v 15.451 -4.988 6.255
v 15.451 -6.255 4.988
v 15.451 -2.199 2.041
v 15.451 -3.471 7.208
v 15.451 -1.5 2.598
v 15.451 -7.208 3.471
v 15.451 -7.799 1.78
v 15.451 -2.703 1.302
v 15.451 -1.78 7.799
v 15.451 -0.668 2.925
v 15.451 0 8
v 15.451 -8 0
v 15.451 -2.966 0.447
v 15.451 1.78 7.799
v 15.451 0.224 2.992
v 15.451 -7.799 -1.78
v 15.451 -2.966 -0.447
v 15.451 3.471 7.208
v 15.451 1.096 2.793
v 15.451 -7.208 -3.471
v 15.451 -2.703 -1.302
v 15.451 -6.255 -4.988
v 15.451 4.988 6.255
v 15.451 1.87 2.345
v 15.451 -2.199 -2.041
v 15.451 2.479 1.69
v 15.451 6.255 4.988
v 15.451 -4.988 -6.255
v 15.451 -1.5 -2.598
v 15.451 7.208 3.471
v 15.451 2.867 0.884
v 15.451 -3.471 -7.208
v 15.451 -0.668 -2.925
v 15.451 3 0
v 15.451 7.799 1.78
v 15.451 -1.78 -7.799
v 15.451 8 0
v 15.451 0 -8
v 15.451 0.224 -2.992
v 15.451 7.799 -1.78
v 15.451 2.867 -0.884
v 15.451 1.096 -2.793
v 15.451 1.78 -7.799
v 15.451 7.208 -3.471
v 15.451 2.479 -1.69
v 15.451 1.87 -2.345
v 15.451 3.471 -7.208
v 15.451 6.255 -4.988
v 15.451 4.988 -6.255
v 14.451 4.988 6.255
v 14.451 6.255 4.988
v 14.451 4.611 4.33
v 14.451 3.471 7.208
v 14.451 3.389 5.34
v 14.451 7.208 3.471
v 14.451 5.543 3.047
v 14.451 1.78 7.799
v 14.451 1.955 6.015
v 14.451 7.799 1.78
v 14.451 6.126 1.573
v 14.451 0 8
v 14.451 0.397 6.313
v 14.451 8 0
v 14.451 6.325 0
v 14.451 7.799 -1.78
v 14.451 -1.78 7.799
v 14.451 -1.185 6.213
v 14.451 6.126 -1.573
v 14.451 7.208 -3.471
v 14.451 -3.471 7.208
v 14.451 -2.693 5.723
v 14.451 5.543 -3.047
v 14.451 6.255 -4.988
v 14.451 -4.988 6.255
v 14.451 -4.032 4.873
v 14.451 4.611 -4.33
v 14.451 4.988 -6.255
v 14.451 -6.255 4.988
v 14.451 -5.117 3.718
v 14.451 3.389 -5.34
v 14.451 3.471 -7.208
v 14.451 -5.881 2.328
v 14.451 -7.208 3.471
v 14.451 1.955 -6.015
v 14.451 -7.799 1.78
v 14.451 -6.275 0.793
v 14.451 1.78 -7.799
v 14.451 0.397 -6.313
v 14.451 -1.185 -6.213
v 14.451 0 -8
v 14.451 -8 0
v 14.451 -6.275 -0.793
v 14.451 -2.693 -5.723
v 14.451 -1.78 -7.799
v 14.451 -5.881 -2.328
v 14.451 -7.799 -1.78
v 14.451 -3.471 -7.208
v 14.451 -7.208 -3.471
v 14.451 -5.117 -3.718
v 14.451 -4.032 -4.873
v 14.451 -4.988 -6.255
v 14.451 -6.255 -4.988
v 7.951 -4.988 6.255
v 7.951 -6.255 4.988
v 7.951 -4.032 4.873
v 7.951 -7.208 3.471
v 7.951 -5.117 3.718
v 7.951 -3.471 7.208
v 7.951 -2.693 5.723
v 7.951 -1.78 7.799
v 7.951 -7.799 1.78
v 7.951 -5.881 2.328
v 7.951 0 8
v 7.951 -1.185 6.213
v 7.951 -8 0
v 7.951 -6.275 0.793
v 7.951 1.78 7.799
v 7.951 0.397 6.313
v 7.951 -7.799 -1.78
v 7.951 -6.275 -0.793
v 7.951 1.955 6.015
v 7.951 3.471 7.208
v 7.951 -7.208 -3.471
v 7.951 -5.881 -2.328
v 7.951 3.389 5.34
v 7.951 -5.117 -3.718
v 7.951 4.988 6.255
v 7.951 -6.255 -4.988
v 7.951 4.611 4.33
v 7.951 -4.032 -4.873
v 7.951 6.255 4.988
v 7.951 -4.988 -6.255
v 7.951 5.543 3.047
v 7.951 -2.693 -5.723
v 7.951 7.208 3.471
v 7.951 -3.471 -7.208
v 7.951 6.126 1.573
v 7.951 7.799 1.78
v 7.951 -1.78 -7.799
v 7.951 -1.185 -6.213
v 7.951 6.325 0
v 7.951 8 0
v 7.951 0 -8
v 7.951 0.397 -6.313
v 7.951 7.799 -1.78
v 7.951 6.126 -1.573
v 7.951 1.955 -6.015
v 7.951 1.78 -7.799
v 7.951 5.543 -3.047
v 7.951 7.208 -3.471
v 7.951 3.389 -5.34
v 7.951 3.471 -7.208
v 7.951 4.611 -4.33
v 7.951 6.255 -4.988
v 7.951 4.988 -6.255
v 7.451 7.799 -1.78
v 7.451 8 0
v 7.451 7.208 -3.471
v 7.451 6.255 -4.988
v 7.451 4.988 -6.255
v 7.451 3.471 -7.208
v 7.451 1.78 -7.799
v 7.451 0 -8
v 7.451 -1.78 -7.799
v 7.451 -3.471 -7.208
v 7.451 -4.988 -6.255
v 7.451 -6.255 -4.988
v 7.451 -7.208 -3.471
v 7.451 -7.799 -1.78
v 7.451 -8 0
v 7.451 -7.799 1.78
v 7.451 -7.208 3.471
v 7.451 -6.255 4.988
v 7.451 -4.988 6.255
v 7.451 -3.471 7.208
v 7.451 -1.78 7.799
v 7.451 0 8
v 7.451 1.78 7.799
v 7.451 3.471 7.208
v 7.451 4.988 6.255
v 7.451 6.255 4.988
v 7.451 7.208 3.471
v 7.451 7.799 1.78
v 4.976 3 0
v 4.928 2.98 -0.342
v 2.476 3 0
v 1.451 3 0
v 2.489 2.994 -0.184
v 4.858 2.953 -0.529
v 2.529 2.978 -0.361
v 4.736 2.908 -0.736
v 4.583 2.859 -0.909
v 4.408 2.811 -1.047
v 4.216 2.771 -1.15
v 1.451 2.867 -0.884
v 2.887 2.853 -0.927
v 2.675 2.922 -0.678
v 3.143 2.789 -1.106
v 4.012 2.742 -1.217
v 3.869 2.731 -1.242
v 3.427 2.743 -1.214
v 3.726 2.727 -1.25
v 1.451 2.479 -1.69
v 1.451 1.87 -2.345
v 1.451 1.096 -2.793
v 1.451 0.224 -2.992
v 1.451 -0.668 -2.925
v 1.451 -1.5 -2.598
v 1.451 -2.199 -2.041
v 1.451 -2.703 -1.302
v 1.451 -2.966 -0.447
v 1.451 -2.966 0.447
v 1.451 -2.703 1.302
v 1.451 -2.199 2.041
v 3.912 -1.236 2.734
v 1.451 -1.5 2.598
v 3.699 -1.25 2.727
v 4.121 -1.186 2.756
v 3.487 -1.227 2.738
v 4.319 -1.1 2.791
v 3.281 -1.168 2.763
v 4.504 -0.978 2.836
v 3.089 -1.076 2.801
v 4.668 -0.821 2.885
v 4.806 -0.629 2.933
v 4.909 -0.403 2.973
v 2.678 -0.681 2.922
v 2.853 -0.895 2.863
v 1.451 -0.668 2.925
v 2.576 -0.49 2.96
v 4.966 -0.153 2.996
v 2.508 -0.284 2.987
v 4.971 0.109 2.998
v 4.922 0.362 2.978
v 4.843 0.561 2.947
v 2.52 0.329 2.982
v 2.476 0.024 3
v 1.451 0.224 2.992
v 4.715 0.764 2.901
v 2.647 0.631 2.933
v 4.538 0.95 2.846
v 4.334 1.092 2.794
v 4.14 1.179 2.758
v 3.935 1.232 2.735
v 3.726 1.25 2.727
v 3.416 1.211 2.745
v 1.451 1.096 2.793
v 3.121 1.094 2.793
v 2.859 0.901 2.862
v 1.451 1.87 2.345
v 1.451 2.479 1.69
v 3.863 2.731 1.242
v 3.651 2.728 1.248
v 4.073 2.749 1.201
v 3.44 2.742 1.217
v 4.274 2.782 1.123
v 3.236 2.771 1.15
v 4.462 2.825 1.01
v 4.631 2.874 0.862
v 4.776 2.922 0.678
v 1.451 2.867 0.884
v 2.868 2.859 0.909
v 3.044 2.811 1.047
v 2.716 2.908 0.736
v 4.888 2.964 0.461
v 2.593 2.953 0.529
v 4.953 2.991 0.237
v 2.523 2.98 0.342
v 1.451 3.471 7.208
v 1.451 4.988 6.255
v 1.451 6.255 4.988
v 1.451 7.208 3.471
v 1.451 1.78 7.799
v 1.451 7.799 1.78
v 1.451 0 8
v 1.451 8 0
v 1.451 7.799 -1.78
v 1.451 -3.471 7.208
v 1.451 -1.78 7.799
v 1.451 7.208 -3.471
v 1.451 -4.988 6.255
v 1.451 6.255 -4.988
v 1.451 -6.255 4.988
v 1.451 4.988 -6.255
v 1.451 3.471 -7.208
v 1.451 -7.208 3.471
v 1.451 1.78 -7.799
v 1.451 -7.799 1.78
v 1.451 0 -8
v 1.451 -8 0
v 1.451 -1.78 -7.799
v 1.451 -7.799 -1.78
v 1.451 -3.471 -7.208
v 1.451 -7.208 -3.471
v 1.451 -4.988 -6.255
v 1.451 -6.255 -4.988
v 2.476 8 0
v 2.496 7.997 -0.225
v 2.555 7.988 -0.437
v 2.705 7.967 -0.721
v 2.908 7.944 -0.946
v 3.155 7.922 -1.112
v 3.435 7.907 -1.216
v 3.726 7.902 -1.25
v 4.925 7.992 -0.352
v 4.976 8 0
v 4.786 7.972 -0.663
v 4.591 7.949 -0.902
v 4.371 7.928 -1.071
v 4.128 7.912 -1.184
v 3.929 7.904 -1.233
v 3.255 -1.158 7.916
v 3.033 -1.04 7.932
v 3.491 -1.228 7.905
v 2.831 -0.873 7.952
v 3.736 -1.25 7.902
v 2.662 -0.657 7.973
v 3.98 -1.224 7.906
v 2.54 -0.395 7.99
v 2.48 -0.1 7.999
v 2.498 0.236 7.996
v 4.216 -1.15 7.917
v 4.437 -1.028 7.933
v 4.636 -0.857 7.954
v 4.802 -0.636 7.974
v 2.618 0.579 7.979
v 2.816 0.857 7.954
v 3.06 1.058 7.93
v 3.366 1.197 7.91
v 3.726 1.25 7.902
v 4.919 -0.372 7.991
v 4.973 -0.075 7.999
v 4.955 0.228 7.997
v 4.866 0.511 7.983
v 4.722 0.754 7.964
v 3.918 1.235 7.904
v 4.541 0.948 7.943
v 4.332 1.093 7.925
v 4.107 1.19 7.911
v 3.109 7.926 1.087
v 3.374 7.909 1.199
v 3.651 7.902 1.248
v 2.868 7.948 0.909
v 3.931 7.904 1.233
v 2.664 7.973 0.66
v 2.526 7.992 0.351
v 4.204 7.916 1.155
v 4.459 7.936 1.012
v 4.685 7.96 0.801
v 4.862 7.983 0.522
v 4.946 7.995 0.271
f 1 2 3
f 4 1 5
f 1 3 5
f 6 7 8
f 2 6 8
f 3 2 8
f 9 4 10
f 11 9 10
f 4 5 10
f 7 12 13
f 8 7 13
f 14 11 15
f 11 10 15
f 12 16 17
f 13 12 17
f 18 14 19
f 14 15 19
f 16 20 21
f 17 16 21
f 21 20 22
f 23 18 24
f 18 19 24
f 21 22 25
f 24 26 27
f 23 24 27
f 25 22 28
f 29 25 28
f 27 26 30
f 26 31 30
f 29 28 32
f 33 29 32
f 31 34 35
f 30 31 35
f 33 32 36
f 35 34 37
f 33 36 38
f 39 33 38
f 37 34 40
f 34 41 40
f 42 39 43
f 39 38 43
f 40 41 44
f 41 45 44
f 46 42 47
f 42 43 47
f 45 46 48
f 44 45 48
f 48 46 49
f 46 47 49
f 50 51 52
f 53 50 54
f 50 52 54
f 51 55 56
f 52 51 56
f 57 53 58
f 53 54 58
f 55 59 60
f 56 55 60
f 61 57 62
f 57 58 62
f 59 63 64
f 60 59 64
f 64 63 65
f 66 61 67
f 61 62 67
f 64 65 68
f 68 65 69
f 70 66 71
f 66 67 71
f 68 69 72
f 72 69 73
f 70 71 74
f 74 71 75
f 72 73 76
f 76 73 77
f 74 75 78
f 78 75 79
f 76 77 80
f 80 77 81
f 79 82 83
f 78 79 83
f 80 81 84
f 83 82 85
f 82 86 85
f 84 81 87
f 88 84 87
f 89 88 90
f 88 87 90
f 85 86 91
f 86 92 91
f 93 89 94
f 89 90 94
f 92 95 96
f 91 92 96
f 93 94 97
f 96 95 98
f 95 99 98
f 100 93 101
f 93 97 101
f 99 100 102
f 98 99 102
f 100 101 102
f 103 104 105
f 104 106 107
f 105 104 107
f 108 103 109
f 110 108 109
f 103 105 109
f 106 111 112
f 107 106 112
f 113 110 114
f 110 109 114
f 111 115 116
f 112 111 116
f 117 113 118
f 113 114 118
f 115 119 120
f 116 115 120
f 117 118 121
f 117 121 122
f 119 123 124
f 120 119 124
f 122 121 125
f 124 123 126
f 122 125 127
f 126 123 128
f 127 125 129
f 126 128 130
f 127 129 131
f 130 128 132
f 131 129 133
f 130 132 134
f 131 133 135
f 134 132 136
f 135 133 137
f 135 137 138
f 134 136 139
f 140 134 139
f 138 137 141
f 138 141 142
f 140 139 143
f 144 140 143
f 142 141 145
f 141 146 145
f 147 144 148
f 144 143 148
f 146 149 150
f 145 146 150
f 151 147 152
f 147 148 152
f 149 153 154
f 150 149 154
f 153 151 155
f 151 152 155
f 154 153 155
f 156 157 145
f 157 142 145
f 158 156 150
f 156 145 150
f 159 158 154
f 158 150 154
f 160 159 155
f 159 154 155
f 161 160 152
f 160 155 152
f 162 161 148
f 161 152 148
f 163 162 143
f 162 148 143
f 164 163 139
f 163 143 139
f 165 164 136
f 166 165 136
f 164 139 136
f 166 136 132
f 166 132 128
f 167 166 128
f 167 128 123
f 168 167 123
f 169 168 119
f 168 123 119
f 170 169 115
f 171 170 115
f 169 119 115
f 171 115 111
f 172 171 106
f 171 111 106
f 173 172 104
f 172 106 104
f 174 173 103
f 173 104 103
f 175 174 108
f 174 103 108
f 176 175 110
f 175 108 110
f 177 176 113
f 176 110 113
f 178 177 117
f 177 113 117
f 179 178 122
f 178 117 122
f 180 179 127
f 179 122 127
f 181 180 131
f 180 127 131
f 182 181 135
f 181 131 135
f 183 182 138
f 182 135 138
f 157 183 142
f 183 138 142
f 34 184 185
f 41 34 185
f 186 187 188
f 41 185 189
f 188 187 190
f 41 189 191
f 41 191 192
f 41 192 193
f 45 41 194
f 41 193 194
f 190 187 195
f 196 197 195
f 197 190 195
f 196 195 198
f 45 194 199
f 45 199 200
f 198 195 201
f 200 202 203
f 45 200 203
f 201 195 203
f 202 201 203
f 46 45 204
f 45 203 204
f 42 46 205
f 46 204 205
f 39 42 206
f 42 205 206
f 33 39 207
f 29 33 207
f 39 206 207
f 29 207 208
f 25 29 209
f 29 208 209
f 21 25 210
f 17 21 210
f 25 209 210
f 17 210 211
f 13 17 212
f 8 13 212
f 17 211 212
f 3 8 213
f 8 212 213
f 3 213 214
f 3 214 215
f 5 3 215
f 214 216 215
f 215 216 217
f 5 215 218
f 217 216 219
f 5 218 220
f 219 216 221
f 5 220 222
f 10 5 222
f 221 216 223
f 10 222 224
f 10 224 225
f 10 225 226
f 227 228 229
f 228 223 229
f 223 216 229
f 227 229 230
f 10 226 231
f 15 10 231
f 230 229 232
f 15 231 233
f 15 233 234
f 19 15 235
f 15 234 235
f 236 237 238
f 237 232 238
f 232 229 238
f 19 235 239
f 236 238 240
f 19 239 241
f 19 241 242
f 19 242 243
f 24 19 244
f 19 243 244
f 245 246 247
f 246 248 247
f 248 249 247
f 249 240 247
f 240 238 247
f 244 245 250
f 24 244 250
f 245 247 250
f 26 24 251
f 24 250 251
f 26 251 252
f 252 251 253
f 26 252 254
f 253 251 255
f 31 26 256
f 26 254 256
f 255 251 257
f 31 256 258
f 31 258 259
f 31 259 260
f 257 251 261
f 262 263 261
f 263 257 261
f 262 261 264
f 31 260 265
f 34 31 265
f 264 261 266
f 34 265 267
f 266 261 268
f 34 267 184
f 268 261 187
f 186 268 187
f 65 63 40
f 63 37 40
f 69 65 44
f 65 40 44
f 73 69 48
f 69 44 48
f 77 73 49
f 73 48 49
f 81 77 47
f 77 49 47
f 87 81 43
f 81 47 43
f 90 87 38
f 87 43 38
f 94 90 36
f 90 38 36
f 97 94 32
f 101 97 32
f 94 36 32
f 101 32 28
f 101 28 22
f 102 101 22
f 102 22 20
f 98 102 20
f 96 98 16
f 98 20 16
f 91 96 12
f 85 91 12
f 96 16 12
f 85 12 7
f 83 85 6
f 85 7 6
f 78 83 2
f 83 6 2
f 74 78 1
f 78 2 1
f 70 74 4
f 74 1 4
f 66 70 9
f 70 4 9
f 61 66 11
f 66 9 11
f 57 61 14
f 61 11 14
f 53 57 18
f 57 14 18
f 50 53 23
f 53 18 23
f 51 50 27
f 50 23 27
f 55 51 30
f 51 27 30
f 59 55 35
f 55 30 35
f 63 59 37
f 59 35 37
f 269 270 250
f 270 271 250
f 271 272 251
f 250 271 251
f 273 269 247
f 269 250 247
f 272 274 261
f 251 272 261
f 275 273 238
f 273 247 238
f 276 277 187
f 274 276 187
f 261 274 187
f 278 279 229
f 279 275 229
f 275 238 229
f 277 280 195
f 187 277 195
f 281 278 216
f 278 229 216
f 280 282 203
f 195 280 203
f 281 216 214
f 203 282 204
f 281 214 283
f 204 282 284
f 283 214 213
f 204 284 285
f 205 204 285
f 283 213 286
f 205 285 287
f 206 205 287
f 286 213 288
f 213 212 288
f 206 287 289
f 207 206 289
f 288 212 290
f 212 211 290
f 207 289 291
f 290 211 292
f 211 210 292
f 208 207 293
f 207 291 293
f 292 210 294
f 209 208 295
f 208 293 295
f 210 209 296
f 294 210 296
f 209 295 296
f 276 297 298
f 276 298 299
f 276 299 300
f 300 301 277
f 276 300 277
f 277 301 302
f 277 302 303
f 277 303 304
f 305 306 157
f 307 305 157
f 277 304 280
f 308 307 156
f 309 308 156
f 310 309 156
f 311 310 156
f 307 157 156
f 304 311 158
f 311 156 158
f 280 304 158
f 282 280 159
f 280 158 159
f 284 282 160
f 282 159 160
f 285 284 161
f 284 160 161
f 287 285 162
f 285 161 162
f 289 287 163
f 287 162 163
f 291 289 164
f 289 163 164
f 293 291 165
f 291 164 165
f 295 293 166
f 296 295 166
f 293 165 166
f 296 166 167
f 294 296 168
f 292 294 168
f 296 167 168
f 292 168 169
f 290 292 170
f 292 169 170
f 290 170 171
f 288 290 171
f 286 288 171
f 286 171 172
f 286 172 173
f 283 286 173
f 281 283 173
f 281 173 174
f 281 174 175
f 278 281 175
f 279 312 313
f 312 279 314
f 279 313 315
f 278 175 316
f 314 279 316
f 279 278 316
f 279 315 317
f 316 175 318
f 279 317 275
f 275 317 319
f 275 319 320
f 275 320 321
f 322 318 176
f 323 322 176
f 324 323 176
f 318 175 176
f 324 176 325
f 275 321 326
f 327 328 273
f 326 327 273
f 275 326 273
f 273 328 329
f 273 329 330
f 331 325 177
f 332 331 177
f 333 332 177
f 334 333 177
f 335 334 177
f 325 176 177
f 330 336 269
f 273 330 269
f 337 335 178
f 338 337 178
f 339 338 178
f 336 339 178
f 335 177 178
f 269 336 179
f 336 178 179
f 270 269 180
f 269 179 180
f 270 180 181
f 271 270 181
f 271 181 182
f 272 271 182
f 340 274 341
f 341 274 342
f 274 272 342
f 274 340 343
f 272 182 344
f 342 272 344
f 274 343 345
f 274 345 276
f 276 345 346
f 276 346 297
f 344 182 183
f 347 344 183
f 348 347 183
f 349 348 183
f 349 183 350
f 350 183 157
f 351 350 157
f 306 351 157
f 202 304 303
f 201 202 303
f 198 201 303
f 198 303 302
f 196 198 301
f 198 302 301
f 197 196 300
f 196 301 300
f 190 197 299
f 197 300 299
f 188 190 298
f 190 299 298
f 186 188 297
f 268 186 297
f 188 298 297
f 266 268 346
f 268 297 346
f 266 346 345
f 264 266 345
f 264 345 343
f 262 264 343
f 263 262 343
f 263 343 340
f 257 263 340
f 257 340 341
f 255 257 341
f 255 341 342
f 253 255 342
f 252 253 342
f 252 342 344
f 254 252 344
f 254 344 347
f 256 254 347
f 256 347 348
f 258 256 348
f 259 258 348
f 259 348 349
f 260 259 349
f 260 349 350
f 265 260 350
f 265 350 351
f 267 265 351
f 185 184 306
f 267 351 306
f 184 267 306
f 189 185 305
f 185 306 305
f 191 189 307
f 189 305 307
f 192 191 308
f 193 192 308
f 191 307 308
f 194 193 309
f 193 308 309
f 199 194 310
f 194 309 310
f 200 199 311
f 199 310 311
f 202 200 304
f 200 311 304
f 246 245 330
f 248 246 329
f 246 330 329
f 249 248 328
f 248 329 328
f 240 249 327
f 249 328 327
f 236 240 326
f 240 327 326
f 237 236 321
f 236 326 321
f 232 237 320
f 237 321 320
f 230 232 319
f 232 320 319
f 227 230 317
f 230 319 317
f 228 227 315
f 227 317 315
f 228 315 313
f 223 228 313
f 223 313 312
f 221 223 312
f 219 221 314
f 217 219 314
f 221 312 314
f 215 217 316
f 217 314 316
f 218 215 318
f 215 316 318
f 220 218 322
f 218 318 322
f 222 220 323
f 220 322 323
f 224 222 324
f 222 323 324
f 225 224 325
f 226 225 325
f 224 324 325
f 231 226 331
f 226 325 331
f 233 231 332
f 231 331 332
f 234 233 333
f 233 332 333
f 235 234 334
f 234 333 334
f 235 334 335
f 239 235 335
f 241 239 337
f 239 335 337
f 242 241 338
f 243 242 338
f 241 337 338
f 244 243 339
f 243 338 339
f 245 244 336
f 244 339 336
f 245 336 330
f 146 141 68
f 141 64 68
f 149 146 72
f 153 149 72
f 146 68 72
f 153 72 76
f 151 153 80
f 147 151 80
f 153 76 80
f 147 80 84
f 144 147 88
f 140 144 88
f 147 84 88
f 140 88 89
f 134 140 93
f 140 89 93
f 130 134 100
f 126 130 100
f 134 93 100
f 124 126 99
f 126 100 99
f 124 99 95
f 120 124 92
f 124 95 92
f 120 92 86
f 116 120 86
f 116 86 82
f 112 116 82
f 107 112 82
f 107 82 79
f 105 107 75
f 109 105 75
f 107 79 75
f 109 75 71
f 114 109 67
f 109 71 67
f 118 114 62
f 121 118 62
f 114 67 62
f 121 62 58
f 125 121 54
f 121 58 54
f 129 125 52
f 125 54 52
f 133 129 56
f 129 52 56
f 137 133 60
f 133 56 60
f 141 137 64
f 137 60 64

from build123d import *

# Parameters (mm, degrees)
SKETCH2_W = 1.25
SKETCH2_H = 8
SKETCH4_W = 1.25
SKETCH4_H = 8


with BuildPart() as part:
    # Sketch1 → Revolve1 (revolve)
    with BuildSketch(Plane.XY):
        Polygon((1.451473536, 3), (1.451473536, 7.999829628), (7.451473536, 8), (7.951473536, 8), (7.951473536, 6.325), (14.451473536, 6.325), (14.451473536, 8), (15.451473536, 8), (15.451473536, 3), align=None)
    revolve(axis=Axis((0, 0, 0), (-1, 0, 0)))

    # Sketch2 → M3x0.5 Tapped Hole1 (revolve, cut)
    with BuildSketch(Plane(origin=(3.725736768, 0, 0), x_dir=(0, 0, -1), z_dir=(1, 0, 0))):
        with Locations((0.625, 4)):
            Rectangle(SKETCH2_W, SKETCH2_H)
    revolve(axis=Axis((3.725736768, -6.35, 0), (0, 1, 0)), mode=Mode.SUBTRACT)

    # Sketch4 → M3x0.5 Tapped Hole2 (revolve, cut)
    with BuildSketch(Plane.YZ.offset(3.725736768)):
        with Locations((0.625, 4)):
            Rectangle(SKETCH4_W, SKETCH4_H)
    revolve(axis=Axis((3.725736768, 0, -6.35), (0, 0, 1)), mode=Mode.SUBTRACT)


solid = part.part
